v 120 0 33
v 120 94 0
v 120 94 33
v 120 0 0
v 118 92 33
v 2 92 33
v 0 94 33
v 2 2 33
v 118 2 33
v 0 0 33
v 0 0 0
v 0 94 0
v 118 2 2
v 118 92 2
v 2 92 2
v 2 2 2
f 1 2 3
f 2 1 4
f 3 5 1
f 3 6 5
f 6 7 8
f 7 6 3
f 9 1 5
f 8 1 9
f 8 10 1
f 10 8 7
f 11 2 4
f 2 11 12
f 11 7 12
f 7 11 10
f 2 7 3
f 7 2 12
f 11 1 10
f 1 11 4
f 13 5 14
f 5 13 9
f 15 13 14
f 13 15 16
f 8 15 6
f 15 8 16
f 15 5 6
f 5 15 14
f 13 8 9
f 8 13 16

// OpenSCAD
difference(){
	union(){ 

        translate([0,0,0]){
           cube([58+58+4,94,33], center=false);
        }
        

	}
	union() {
        translate([2,2,2]){
           cube([58+58,90,99], center=false);
        }
	}
}
